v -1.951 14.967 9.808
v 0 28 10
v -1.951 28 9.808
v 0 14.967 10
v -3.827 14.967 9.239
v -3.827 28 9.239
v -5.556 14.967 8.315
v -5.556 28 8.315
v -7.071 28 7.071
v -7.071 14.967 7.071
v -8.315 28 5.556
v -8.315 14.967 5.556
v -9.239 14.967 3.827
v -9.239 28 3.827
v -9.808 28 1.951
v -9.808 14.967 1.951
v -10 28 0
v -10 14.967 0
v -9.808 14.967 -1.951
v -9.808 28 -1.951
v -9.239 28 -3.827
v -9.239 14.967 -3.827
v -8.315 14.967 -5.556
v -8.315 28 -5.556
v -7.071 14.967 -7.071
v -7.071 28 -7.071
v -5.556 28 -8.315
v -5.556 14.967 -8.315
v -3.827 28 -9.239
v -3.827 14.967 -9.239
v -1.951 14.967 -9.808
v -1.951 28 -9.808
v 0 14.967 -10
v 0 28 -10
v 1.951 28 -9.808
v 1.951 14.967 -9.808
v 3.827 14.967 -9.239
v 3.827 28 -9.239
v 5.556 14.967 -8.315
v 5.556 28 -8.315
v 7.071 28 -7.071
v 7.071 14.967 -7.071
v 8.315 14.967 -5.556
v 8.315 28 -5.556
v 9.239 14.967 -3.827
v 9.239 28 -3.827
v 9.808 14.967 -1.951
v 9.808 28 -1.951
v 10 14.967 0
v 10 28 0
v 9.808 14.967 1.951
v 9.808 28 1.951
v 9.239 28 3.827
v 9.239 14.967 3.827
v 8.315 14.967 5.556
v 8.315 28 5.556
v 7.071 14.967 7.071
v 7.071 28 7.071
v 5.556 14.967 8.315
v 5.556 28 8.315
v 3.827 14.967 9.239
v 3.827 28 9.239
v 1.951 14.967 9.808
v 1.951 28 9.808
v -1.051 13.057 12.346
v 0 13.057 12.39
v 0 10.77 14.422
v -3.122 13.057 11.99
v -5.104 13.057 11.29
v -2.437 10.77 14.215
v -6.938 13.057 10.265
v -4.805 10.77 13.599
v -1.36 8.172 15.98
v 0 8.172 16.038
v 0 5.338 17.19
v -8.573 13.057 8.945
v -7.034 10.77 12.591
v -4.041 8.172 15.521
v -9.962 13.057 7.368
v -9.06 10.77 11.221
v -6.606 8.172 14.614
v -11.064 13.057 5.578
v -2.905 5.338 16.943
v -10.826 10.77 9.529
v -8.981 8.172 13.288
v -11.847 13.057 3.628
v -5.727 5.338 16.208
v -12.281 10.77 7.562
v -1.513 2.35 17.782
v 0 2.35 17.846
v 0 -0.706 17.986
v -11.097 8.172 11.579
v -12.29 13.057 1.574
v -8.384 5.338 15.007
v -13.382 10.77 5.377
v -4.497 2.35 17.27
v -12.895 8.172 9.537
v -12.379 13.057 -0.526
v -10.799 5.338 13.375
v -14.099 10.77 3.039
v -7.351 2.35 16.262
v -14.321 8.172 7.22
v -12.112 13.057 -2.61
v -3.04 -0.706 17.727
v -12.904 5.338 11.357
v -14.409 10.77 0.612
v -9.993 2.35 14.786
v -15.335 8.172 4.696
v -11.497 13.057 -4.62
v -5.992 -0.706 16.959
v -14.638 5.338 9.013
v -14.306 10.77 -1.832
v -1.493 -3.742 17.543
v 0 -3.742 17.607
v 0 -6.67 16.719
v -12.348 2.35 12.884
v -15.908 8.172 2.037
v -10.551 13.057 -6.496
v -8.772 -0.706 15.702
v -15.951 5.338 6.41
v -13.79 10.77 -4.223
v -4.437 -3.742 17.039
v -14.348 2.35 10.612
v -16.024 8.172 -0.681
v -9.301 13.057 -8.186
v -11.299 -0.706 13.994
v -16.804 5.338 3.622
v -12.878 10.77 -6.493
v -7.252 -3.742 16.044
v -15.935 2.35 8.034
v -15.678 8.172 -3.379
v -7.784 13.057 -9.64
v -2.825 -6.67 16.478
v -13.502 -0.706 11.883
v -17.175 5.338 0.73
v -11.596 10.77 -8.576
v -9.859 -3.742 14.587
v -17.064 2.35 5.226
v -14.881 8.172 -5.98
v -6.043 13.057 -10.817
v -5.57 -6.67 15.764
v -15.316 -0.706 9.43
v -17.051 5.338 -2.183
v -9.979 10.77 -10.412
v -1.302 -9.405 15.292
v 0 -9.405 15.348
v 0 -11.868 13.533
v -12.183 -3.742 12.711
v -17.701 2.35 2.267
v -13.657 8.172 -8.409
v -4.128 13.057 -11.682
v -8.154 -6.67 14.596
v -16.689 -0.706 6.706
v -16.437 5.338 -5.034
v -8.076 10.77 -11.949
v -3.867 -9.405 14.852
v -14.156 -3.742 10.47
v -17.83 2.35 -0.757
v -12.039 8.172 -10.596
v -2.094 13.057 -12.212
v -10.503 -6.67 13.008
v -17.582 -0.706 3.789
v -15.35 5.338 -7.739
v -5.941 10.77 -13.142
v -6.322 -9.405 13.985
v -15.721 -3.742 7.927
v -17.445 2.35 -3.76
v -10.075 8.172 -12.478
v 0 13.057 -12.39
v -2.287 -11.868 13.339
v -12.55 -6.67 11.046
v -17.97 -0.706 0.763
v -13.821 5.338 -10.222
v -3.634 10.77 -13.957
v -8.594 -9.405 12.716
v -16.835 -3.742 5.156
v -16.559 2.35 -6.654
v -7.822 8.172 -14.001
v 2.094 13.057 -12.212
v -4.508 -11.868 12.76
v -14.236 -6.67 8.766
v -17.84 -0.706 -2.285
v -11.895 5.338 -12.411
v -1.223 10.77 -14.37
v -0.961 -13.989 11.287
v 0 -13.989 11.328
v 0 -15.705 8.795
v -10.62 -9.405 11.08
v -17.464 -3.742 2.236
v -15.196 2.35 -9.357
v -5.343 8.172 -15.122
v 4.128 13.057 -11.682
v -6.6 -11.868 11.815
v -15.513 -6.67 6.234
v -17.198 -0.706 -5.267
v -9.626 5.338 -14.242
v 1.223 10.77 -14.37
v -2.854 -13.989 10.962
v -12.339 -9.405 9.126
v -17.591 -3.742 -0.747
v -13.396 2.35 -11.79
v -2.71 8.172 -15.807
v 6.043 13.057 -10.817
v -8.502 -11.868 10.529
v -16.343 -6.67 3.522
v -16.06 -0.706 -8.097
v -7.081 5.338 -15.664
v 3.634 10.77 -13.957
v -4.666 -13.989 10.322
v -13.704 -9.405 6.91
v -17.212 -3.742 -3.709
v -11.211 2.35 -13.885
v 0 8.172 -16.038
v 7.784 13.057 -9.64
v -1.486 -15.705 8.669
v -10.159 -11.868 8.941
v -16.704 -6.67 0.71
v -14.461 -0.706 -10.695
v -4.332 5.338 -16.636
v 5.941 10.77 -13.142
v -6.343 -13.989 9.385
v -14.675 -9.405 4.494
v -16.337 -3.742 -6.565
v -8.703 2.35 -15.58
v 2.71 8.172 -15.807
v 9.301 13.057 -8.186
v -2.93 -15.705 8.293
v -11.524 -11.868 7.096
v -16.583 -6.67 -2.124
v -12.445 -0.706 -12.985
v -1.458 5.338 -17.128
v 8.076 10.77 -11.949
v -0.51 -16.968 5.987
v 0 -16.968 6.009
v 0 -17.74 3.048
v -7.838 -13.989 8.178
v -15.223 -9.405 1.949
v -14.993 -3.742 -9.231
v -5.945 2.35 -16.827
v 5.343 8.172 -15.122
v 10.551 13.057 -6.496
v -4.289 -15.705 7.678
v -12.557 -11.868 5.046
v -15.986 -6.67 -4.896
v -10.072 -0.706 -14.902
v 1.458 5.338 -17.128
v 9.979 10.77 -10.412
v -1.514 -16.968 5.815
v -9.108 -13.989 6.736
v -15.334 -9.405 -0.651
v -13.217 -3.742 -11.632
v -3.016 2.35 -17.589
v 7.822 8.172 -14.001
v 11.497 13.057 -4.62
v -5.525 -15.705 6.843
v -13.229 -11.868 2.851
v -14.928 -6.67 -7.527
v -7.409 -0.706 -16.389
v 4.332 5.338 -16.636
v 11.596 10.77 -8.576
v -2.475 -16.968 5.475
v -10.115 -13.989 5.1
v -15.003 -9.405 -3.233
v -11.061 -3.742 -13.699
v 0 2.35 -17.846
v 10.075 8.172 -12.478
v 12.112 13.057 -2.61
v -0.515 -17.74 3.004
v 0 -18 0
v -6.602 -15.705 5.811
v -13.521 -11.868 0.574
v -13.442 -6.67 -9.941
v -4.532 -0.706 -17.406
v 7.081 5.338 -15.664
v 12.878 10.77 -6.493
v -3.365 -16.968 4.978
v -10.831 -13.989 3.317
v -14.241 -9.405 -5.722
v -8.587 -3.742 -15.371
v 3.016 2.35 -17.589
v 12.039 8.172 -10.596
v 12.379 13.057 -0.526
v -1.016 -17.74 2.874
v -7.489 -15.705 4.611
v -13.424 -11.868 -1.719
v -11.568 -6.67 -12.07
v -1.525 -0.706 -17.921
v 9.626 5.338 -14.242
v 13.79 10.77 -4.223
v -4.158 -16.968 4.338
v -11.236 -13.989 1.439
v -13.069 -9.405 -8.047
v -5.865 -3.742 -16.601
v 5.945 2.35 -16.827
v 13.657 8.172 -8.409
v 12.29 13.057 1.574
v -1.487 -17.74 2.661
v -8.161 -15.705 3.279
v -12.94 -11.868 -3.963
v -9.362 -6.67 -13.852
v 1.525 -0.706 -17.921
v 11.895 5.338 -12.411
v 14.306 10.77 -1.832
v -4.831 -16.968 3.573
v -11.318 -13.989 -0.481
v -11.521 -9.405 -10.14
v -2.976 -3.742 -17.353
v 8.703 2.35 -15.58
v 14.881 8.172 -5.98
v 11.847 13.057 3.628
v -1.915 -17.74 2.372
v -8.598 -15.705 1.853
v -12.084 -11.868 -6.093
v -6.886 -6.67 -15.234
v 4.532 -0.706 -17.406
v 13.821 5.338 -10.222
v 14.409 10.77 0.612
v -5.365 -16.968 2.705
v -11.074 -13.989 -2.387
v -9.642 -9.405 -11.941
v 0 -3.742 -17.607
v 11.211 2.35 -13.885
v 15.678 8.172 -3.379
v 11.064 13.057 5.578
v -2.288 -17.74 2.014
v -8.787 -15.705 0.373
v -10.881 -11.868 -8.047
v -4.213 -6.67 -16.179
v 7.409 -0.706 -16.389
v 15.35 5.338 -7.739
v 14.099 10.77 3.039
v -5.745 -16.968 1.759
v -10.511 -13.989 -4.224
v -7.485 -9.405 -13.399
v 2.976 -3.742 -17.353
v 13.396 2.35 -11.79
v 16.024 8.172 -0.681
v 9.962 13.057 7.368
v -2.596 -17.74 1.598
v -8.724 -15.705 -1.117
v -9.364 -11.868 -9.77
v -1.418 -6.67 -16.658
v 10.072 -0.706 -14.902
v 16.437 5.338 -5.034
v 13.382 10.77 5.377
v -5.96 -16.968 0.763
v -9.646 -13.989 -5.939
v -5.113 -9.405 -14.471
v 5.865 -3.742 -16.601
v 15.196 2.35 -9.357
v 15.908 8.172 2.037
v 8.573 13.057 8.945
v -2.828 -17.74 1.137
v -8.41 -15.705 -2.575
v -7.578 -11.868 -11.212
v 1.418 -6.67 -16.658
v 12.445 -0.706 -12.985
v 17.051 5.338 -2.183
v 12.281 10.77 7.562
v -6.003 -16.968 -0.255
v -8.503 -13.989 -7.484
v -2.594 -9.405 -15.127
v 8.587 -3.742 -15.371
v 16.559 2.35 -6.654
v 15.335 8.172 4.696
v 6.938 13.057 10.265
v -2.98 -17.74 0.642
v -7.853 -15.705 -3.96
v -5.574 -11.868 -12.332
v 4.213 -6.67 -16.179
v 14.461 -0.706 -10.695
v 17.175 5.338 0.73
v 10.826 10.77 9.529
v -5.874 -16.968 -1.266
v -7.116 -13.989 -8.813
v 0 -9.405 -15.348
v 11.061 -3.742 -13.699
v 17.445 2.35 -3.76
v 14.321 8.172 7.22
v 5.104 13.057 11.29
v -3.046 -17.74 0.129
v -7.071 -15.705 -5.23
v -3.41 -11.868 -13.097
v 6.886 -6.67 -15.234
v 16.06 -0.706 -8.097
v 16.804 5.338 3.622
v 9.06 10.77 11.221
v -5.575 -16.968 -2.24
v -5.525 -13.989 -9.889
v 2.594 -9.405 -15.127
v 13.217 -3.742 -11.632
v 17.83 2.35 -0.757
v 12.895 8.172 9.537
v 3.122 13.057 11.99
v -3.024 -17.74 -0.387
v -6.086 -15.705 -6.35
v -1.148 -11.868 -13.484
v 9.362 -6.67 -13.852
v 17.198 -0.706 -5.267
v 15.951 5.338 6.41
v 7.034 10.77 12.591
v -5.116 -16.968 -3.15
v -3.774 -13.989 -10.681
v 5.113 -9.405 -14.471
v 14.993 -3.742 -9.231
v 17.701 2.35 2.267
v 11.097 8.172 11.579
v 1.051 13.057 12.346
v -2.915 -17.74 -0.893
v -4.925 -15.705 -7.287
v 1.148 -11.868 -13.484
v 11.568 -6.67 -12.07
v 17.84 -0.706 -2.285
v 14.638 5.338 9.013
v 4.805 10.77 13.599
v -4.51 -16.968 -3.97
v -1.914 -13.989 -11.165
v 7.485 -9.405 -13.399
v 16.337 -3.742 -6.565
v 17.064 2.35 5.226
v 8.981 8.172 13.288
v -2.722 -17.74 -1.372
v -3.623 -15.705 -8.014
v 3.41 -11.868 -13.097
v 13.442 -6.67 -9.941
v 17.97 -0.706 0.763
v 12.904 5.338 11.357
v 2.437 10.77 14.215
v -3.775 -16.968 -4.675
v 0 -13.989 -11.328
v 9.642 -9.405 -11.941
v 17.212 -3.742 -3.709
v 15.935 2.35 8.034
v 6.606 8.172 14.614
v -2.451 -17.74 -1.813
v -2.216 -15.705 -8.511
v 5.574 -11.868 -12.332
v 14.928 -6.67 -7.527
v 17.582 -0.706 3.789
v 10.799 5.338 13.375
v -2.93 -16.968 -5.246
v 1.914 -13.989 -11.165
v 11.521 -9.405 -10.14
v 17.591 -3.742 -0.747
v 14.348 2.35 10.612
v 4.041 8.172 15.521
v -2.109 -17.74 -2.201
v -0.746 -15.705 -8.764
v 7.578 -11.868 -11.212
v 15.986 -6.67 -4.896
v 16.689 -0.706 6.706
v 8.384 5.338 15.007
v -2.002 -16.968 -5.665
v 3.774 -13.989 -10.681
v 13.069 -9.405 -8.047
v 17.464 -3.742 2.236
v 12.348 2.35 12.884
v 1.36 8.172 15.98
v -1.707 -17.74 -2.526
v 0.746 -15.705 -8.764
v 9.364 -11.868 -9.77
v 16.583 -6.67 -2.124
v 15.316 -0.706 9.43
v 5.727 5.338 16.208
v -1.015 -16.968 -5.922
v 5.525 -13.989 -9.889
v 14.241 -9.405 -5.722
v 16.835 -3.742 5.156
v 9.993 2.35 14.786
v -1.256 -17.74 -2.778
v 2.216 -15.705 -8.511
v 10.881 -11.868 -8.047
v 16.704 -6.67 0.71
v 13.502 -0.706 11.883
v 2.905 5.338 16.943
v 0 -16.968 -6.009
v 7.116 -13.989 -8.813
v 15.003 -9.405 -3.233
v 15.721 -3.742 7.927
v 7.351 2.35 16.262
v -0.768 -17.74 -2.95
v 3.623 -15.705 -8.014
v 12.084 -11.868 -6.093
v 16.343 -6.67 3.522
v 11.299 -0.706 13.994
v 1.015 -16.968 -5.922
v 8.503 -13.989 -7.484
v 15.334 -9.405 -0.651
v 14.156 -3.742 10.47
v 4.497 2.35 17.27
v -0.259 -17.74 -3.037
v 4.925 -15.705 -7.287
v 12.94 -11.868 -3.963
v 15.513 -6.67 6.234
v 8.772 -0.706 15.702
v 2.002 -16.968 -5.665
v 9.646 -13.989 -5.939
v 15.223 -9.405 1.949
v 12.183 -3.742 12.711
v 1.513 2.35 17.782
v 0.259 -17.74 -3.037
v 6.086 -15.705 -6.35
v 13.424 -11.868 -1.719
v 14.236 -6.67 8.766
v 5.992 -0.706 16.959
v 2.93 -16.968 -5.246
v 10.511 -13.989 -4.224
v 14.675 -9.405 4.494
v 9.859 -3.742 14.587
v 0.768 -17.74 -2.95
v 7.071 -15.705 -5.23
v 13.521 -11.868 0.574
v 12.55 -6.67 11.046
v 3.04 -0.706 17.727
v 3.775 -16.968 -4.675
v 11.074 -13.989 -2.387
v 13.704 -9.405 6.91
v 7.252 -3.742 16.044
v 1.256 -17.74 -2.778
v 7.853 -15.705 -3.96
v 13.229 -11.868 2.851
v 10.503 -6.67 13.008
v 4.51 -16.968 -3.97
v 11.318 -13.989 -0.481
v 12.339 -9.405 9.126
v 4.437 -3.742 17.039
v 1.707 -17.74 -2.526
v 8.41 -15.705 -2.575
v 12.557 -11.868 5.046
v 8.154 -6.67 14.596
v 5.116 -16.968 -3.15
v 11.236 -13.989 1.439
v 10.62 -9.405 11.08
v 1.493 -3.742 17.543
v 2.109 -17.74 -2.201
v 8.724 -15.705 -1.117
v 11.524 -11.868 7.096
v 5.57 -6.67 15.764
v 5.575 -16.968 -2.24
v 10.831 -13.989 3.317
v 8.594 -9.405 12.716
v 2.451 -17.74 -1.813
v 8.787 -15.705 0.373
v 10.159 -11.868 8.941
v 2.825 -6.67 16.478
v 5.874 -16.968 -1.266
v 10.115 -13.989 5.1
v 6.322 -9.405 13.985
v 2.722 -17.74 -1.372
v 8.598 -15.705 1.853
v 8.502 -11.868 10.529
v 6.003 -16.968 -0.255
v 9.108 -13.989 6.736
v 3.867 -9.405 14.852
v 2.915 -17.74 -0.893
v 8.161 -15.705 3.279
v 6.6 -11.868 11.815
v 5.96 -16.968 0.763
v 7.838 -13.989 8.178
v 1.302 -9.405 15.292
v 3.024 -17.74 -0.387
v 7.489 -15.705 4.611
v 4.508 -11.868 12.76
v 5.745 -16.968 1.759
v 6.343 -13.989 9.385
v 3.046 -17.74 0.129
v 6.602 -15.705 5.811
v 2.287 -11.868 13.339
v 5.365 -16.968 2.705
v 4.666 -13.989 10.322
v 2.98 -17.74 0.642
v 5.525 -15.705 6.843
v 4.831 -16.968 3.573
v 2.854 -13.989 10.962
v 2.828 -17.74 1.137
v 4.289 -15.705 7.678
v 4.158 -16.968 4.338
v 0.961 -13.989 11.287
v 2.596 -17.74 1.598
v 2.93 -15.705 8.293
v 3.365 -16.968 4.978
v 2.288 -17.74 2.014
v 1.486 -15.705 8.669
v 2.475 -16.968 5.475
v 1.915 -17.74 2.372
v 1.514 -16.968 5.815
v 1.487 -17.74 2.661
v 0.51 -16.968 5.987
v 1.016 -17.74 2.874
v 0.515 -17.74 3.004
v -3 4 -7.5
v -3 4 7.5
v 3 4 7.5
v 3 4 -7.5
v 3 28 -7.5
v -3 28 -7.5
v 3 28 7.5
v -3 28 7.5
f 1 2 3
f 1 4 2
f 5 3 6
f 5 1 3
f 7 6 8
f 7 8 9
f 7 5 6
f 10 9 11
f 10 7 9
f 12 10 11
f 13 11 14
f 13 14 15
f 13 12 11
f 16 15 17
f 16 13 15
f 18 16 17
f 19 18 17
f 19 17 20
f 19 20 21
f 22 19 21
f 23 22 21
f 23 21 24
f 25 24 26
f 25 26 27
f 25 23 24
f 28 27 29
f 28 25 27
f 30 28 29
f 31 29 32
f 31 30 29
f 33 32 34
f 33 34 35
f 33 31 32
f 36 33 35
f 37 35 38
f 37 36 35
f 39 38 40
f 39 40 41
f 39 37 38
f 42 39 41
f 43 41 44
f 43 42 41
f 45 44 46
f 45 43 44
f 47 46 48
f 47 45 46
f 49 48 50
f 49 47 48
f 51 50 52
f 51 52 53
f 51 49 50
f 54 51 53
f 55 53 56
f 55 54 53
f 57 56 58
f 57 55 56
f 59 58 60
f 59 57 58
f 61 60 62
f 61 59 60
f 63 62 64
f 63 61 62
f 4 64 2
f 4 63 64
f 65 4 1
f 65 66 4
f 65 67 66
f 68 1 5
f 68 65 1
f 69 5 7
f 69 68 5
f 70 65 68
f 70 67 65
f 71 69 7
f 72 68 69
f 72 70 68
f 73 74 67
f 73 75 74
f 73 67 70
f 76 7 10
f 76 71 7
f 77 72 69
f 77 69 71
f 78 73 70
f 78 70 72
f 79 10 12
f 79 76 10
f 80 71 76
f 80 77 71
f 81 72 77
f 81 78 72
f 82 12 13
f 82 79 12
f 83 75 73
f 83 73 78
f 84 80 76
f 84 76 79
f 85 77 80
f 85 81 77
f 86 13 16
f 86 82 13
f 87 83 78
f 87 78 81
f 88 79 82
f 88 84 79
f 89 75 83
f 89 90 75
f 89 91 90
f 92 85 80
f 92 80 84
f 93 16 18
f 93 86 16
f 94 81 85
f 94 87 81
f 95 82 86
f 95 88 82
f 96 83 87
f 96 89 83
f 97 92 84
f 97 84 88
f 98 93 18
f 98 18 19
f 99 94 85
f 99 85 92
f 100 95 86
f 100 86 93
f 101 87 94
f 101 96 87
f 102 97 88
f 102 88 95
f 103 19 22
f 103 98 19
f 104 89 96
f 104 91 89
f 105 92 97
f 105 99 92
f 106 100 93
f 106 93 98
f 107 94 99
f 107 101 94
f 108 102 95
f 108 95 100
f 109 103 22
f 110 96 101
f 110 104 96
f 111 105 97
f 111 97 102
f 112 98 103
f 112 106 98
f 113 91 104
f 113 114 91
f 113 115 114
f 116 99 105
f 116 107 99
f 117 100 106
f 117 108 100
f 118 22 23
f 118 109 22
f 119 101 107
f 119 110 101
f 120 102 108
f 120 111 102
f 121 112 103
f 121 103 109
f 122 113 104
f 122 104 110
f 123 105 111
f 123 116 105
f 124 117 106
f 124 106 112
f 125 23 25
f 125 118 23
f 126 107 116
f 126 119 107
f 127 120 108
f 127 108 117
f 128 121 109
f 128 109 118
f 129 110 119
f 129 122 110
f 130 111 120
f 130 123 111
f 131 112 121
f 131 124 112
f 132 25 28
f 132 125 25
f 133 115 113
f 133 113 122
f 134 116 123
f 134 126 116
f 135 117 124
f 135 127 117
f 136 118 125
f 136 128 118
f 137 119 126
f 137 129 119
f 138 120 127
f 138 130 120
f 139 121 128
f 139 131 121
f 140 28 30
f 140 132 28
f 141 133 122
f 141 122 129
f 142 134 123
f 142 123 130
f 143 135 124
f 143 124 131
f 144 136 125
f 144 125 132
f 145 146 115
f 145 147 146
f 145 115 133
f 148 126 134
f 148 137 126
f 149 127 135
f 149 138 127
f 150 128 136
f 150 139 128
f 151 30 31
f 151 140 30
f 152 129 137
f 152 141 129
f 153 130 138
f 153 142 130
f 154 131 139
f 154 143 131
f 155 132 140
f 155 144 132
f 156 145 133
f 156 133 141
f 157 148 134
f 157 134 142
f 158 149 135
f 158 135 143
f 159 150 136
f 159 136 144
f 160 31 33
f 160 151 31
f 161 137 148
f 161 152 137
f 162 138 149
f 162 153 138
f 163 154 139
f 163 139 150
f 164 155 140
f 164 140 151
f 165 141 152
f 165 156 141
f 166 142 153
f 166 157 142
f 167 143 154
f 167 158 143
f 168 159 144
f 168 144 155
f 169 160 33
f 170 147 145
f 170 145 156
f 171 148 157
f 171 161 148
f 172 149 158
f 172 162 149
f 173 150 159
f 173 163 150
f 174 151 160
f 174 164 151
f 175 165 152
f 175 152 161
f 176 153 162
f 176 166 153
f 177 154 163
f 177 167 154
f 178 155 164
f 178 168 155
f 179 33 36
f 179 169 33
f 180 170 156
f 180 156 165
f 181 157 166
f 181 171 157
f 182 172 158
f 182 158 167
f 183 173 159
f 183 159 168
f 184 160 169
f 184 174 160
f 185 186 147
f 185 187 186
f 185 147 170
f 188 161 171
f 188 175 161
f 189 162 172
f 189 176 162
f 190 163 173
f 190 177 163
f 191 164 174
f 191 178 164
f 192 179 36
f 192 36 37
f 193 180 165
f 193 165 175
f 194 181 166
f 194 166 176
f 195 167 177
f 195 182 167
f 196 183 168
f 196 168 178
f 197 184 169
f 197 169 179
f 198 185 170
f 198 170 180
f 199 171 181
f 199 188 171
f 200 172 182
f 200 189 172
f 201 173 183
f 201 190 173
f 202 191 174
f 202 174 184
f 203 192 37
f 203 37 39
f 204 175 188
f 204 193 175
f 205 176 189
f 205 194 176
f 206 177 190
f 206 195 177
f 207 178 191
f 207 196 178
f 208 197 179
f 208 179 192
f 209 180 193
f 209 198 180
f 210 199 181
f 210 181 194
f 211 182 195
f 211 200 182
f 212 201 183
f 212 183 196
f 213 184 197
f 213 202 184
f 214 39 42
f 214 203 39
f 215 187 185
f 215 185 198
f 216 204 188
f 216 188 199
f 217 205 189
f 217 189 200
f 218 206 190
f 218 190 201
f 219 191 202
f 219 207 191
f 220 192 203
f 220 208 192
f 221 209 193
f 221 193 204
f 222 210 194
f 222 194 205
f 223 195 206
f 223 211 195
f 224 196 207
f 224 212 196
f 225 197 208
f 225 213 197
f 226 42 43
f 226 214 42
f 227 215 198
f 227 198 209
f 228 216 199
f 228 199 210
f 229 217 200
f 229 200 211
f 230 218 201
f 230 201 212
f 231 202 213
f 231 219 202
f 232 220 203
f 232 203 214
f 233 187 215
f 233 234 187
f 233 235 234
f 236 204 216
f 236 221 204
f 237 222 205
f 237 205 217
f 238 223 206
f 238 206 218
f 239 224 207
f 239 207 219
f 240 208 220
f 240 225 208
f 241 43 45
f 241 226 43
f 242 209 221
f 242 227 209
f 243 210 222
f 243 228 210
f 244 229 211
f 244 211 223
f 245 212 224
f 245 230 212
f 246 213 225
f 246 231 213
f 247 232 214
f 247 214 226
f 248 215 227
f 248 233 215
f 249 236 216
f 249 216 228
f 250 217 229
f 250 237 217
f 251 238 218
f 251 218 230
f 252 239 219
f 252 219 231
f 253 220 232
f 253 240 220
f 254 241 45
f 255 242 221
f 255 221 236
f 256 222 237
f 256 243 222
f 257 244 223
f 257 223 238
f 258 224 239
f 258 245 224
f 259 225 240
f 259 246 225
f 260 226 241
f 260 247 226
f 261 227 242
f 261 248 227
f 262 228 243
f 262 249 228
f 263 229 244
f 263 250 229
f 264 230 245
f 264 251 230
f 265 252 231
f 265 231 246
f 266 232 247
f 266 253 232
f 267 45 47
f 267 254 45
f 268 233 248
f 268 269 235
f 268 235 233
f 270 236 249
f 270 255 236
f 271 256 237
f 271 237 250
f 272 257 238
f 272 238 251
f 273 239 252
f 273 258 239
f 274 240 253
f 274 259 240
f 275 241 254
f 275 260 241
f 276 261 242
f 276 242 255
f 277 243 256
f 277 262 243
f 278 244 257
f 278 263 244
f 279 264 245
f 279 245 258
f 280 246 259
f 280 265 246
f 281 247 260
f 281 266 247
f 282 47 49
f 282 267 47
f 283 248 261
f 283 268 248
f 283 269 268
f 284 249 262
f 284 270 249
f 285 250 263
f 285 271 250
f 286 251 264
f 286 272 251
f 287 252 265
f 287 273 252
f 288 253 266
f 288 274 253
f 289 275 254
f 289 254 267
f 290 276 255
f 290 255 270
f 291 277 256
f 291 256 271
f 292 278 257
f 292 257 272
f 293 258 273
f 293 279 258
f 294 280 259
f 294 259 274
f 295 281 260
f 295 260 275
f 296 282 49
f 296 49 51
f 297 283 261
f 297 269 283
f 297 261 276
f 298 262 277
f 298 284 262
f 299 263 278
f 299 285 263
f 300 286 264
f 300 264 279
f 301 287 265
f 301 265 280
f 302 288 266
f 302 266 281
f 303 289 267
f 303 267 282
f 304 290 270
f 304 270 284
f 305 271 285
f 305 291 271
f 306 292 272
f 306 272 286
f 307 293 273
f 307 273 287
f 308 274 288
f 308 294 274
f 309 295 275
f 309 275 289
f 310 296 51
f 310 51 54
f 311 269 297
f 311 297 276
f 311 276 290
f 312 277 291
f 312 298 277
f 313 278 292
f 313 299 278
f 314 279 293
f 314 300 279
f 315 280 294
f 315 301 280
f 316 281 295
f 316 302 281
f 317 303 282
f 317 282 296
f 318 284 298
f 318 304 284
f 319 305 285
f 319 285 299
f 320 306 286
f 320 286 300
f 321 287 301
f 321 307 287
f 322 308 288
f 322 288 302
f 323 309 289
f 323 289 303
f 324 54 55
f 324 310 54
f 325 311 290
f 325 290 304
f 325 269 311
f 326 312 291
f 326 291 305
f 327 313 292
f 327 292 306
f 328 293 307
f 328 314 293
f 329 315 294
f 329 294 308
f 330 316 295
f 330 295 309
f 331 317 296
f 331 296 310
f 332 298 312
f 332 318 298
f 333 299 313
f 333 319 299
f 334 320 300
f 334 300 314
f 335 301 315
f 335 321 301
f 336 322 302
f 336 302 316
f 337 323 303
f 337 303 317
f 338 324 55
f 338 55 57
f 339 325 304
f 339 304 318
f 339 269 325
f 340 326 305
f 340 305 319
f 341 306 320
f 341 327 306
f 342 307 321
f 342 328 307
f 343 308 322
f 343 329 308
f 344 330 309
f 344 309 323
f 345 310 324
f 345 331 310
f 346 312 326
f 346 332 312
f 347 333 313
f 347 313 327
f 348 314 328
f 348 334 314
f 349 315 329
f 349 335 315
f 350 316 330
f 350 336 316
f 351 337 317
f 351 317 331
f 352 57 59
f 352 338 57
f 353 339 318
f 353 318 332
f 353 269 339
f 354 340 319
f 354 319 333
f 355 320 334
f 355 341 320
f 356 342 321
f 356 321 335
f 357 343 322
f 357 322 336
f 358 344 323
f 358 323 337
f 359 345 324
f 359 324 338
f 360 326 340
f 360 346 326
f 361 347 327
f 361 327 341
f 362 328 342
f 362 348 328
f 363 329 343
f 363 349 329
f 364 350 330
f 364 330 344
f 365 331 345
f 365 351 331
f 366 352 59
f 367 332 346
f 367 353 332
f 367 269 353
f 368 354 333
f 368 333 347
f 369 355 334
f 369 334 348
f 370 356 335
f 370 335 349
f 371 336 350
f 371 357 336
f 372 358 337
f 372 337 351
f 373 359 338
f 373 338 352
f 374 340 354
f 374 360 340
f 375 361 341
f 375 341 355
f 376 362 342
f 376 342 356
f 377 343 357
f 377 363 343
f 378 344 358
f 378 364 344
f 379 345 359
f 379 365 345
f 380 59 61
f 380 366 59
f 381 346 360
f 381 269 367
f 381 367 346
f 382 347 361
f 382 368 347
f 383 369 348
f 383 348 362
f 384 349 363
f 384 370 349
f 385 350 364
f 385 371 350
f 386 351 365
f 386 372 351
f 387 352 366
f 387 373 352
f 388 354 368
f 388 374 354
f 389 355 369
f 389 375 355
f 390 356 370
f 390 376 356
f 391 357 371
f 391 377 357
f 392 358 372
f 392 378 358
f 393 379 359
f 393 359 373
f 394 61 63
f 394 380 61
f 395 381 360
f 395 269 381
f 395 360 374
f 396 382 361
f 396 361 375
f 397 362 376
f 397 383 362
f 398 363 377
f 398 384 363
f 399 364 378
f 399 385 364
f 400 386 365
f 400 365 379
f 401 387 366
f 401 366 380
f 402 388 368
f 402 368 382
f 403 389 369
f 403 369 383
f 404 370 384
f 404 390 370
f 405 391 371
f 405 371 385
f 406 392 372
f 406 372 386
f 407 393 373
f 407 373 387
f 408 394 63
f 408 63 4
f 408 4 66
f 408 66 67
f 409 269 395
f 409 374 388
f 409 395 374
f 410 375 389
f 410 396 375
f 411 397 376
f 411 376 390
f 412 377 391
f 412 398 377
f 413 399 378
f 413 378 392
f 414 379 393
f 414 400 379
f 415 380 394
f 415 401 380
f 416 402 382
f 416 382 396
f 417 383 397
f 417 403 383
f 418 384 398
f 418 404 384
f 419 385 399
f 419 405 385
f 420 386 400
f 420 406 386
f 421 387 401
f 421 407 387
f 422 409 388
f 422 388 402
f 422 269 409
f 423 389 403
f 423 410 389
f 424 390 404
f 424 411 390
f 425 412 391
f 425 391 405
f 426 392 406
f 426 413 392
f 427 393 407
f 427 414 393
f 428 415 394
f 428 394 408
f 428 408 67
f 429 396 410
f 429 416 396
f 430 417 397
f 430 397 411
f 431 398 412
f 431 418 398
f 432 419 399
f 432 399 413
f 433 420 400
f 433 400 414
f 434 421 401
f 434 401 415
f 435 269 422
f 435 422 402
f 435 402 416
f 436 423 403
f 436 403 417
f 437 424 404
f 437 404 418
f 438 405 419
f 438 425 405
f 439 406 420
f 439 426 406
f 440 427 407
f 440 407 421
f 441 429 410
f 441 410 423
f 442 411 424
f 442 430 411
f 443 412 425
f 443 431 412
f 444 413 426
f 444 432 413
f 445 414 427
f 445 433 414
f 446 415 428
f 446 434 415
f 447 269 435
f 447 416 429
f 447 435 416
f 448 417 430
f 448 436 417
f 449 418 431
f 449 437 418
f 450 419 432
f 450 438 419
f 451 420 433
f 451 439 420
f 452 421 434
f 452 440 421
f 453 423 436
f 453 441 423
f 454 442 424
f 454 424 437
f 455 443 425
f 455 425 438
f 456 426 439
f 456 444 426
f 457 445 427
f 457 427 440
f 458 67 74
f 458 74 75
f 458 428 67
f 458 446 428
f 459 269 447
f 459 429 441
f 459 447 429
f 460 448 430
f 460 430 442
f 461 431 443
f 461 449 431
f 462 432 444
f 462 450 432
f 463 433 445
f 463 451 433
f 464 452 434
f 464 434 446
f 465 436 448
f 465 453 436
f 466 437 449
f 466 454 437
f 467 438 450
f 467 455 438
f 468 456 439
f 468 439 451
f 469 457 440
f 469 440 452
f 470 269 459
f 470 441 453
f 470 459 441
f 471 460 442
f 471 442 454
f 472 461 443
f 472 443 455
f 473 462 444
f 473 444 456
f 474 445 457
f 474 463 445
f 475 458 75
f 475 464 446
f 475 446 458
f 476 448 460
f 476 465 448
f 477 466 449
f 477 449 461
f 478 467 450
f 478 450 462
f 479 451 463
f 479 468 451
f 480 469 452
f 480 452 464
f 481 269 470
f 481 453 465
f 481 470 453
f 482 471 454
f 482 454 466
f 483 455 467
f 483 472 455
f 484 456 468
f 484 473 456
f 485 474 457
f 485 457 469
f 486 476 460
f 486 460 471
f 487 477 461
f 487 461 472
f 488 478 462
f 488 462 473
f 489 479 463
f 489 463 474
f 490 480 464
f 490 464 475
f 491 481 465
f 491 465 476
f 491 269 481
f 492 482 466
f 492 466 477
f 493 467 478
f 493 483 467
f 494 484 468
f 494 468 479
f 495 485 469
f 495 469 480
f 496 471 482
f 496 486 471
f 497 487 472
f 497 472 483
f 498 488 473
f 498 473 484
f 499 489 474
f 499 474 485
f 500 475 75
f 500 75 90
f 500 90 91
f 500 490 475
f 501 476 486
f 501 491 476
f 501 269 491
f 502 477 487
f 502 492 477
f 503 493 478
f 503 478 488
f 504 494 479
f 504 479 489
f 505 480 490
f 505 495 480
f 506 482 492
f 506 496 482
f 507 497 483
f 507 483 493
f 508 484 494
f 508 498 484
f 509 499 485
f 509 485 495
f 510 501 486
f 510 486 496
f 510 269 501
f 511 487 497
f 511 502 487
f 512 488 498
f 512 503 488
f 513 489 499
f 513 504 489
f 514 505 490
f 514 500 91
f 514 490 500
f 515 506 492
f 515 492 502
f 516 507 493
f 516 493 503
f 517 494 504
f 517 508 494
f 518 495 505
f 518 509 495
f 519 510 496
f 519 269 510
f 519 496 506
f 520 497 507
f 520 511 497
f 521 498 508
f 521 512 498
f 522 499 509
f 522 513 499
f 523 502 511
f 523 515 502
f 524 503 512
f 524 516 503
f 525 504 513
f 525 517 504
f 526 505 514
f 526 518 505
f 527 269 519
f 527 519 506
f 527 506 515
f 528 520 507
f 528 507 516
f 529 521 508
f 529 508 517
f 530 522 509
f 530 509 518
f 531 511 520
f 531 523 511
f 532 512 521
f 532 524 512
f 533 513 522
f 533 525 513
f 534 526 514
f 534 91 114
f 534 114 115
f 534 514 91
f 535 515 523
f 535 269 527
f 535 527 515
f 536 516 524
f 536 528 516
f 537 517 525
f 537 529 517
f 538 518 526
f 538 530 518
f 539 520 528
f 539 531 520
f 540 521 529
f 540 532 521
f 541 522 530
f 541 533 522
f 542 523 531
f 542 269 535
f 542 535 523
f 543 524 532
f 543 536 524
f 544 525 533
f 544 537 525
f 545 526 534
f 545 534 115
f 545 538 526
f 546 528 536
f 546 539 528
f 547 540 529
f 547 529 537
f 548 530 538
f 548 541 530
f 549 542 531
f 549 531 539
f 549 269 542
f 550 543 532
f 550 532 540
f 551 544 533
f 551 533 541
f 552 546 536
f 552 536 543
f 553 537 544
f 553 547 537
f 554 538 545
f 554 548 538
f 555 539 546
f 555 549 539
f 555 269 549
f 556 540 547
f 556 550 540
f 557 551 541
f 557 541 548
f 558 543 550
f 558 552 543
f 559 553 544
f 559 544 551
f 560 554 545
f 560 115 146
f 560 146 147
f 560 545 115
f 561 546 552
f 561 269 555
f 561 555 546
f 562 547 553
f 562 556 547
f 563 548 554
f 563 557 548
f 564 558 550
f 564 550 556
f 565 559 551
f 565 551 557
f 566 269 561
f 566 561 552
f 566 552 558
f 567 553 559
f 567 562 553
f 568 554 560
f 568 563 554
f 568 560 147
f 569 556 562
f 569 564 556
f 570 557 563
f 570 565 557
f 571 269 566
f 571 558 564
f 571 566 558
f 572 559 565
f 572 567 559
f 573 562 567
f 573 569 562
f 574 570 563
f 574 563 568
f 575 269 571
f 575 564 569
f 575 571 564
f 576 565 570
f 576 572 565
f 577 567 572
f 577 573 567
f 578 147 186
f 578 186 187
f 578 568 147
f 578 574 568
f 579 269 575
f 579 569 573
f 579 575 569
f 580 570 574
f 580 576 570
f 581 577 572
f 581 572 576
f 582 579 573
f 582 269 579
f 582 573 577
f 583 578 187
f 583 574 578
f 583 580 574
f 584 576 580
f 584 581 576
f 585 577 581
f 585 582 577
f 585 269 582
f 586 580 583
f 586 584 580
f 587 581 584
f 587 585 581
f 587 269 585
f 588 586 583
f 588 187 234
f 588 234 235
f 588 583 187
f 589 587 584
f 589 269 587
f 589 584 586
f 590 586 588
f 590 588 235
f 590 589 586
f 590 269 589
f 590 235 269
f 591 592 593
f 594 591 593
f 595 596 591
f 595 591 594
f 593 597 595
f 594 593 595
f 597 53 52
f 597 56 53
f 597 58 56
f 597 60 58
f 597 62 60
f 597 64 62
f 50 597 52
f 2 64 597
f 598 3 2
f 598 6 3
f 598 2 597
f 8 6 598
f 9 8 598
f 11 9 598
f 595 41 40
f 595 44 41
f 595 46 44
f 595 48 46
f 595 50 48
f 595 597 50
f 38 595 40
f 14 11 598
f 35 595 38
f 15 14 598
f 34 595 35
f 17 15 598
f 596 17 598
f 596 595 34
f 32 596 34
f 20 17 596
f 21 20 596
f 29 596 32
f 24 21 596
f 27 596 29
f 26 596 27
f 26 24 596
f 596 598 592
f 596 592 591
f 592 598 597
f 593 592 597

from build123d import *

# Parameters (mm, degrees)
SKETCH_2_W          = 6
SKETCH_2_H          = 15
CUT_EXTRUDE_1_DEPTH = 24


with BuildPart() as part:
    # 草图1 → 旋转1 (revolve)
    with BuildSketch(Plane.XY, mode=Mode.PRIVATE) as revolve_1_sk:
        with BuildLine():
            Line((-10, 28), (-10, 14.966629547))
            ThreePointArc((-10, 14.966629547), (-17.22497216, -5.22497216), (0, -18))
            Line((0, -18), (0, 28))
            Line((0, 28), (-10, 28))
        make_face()
    revolve(revolve_1_sk.sketch.rotate(Axis((0, 81.279546427, 0), (0, -1, 0)), 270), axis=Axis((0, 81.279546427, 0), (0, -1, 0)))

    # 草图2 → 切除-拉伸1 (cut)
    with BuildSketch(Plane(origin=(0, 28, 0), x_dir=(1, 0, 0), z_dir=(0, 1, 0))):
        Rectangle(SKETCH_2_W, SKETCH_2_H)
    extrude(amount=-CUT_EXTRUDE_1_DEPTH, mode=Mode.SUBTRACT)


solid = part.part
